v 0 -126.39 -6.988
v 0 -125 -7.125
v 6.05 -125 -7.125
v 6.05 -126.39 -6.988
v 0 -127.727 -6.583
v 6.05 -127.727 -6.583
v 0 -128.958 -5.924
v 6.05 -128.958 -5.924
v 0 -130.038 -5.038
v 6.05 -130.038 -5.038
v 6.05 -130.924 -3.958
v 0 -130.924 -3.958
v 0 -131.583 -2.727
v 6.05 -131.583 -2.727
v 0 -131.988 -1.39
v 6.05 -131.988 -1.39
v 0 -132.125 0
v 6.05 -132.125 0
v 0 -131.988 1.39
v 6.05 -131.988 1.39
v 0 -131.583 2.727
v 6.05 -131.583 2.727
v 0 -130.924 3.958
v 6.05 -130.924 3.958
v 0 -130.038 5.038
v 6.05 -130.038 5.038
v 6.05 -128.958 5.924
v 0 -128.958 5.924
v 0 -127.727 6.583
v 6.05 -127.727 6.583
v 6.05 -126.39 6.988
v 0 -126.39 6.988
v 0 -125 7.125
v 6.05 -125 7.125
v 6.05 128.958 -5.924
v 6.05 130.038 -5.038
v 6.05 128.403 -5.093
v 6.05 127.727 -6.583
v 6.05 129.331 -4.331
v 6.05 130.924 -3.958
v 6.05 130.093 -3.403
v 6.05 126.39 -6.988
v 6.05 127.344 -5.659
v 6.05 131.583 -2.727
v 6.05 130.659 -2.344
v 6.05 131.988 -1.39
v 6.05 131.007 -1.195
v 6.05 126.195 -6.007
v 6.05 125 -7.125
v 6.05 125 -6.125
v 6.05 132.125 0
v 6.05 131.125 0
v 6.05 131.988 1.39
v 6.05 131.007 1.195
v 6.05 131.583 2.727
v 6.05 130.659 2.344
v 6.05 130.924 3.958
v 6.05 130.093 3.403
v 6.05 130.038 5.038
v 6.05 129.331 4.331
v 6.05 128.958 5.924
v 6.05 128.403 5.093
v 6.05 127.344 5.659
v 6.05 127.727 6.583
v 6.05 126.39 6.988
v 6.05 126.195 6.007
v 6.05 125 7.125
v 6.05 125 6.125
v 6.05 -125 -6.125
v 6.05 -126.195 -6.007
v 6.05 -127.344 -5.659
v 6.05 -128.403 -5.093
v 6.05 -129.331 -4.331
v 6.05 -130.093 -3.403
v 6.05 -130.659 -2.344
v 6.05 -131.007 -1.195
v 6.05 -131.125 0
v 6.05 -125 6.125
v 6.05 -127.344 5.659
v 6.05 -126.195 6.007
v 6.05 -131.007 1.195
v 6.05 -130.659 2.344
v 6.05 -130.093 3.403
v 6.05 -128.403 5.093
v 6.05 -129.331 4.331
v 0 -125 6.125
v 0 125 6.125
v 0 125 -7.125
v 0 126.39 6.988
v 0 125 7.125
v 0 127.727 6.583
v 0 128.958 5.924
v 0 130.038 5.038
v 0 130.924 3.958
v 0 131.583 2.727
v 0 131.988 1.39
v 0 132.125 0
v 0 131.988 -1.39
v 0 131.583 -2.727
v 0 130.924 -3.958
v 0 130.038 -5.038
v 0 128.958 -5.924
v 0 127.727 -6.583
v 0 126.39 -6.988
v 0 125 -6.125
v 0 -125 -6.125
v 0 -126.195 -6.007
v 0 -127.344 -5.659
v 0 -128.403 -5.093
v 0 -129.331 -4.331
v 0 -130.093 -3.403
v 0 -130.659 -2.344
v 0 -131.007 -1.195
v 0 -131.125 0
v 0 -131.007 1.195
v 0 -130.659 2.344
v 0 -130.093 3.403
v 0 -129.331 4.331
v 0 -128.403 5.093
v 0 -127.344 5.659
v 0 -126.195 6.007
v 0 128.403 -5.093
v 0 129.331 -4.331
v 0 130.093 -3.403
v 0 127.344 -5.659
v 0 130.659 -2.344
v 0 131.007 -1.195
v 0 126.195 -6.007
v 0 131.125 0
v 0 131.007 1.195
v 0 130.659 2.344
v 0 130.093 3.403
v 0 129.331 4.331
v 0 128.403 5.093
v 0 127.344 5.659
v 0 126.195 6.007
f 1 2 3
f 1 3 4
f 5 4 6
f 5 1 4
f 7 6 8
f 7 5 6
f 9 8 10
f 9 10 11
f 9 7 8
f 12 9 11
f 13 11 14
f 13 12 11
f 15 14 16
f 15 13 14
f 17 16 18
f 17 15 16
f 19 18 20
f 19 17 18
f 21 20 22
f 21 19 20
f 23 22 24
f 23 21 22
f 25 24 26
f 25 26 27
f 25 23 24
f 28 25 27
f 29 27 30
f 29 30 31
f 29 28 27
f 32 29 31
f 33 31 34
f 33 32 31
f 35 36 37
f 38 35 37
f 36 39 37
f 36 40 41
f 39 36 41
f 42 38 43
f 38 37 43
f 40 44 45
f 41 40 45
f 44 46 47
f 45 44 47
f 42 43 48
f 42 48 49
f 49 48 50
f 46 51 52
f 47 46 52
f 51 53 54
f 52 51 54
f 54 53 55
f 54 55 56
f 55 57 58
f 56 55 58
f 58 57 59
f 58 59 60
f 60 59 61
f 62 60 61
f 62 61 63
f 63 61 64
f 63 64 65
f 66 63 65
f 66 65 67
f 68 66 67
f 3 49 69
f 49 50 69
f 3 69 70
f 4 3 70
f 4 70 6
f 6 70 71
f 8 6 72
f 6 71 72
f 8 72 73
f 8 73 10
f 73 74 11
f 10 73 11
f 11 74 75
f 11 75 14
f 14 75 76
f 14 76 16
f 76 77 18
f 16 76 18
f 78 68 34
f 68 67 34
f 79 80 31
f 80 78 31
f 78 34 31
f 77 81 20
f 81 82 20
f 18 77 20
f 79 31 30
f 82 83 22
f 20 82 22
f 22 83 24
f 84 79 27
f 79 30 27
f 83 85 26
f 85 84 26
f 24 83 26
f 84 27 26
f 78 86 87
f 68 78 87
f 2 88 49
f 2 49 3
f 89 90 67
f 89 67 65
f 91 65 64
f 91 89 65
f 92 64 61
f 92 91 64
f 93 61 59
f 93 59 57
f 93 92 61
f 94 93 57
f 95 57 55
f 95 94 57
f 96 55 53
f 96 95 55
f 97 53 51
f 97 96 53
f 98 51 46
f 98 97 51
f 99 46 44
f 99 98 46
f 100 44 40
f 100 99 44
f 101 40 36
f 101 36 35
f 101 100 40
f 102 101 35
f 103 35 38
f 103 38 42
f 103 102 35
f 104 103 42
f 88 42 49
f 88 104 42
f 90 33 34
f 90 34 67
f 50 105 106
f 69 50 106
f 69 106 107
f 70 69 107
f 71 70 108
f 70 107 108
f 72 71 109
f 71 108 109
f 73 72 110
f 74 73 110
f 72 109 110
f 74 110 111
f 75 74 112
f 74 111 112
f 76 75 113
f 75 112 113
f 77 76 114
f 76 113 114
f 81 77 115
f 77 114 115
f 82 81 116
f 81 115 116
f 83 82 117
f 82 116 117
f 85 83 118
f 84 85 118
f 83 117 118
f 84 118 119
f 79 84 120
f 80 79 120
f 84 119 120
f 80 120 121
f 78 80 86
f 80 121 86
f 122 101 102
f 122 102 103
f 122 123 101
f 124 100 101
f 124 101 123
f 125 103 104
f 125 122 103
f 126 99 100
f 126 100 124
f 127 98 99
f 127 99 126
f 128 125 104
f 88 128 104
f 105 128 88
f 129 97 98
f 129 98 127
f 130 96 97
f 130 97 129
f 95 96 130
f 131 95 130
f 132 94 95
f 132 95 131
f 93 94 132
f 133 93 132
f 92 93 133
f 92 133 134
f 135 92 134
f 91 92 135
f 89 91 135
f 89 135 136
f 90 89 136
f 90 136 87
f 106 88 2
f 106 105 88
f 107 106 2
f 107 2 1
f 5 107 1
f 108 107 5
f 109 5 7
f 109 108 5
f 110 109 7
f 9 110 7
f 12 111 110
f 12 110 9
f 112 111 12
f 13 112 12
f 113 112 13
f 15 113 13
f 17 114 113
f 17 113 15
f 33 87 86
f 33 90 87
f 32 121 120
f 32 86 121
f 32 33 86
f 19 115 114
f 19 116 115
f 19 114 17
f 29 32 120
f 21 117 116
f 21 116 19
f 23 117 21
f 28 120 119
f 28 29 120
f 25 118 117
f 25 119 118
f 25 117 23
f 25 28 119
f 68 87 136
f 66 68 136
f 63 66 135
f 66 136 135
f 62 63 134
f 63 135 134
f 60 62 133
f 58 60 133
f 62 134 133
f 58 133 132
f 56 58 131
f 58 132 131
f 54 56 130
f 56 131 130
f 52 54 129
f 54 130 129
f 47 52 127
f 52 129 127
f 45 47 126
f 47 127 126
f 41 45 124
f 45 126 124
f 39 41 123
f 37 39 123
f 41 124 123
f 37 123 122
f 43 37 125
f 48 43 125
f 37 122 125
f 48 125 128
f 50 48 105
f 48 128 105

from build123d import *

# Parameters (mm, degrees)
BOSS_EXTRUDE1_DEPTH = 6.05


with BuildPart() as part:
    # Sketch1 → Boss-Extrude1 (new body)
    with BuildSketch(Plane.YZ):
        with BuildLine():
            Line((-125, 7.125), (125, 7.125))
            ThreePointArc((125, 7.125), (132.125, 0), (125, -7.125))
            Line((125, -7.125), (-125, -7.125))
            ThreePointArc((-125, -7.125), (-132.125, 0), (-125, 7.125))
        make_face()
        with BuildLine():
            Line((-125, 6.125), (125, 6.125))
            ThreePointArc((125, 6.125), (131.125, 0), (125, -6.125))
            Line((125, -6.125), (-125, -6.125))
            ThreePointArc((-125, -6.125), (-131.125, 0), (-125, 6.125))
        make_face(mode=Mode.SUBTRACT)
    extrude(amount=BOSS_EXTRUDE1_DEPTH)


solid = part.part
